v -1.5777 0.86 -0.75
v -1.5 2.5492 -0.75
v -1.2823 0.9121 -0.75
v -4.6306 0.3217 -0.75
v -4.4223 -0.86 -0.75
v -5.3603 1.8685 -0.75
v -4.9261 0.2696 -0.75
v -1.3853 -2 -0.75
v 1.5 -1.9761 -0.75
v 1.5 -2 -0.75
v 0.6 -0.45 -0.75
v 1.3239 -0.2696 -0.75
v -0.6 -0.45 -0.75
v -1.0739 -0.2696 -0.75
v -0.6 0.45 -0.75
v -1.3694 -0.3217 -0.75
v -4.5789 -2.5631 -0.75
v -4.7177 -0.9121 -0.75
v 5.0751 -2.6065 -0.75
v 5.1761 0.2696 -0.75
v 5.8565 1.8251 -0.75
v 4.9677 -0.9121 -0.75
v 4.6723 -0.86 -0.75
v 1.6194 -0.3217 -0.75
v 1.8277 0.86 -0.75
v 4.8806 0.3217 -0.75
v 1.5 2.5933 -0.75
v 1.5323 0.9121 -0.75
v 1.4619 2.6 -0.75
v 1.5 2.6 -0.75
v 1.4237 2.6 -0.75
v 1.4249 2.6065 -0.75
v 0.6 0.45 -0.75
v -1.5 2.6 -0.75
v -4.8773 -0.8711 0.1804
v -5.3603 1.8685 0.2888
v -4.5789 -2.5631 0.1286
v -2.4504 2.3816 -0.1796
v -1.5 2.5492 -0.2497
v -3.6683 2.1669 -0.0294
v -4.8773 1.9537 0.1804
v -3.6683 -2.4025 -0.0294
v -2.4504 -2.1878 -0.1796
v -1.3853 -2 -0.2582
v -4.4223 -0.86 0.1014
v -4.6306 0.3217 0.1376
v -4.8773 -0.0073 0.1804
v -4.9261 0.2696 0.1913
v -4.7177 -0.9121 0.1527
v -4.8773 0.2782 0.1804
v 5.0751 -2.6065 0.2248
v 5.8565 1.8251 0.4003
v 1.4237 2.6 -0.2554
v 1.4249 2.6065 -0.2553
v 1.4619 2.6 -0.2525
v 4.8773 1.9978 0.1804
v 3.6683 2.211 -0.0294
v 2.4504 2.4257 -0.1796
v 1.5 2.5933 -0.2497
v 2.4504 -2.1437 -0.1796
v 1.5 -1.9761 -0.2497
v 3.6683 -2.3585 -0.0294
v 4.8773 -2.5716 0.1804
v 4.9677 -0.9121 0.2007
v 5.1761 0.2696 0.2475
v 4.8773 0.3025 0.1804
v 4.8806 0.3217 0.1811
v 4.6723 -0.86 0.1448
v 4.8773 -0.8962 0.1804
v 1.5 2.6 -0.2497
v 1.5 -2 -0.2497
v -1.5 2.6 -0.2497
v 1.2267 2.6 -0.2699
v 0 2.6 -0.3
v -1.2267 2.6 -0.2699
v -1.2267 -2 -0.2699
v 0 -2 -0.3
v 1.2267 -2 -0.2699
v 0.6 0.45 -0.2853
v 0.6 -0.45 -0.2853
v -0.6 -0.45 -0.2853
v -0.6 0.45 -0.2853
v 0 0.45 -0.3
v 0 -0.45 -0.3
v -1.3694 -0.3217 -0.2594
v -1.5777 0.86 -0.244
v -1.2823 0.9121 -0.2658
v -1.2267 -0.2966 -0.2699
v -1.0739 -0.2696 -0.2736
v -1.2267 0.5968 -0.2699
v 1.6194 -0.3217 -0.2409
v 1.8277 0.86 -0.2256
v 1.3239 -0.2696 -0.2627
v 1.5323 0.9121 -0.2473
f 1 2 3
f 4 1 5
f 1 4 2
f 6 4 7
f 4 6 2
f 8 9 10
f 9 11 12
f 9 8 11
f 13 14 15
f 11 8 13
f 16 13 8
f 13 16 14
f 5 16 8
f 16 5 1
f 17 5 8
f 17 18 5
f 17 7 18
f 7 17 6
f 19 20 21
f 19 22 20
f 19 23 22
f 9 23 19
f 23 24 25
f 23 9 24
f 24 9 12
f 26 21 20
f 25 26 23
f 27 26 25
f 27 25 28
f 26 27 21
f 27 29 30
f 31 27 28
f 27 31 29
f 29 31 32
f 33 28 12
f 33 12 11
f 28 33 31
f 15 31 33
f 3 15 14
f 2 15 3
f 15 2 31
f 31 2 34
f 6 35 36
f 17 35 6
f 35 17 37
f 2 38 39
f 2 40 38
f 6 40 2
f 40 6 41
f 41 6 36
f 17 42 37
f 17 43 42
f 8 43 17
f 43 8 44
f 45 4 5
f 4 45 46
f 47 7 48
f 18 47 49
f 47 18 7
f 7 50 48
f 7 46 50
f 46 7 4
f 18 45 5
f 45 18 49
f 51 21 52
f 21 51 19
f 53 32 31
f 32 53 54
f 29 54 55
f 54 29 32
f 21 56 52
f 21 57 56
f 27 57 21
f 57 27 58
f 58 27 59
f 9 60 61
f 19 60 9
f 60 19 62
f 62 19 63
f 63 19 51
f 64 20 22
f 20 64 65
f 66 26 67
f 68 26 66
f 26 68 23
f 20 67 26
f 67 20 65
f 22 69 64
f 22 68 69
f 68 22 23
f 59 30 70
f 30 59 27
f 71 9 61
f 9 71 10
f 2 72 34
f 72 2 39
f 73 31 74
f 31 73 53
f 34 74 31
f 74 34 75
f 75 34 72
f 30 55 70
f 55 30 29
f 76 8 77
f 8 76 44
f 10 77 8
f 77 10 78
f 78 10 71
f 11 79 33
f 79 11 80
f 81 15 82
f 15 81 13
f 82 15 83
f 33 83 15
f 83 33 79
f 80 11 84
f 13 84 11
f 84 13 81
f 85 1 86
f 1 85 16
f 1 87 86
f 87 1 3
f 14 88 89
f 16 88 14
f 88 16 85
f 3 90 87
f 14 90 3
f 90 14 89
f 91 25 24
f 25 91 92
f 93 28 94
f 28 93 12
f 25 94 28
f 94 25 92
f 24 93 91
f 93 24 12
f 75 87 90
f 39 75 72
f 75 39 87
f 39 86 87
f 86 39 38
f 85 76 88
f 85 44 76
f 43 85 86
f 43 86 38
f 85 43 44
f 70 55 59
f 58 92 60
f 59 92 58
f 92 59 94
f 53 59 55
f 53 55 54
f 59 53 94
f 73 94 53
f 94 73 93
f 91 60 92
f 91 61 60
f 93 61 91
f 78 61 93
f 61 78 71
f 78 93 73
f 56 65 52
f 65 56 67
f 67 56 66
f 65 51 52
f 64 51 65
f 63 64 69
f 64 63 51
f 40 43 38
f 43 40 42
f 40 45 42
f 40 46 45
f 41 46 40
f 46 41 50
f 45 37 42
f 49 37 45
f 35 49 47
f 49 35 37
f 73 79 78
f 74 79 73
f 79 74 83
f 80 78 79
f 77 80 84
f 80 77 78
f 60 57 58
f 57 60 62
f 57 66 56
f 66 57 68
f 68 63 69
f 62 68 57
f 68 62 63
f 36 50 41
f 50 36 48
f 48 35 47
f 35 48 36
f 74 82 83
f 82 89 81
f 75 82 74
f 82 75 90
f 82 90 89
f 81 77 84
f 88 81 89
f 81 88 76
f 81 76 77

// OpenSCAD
// Generated by SolidPython 1.1.3 on 2024-04-22 10:17:04
$fn = 128;


union() {
	difference() {
		scale(v = [1, 1, 1.5000000000]) {
			difference() {
				difference() {
					union() {
						translate(v = [-3, 0, 0]) {
							rotate(a = [0, 0, 10]) {
								difference() {
									cube(center = true, size = [4, 4.5000000000, 1]);
									translate(v = [-1.7000000000, 0, 0]) {
										cube(center = true, size = [0.3000000000, 1.2000000000, 10]);
									}
								}
							}
						}
						translate(v = [3.2500000000, 0, 0]) {
							rotate(a = [0, 0, -10]) {
								difference() {
									cube(center = true, size = [4.5000000000, 4.5000000000, 1]);
									translate(v = [1.7000000000, 0, 0]) {
										cube(center = true, size = [0.3000000000, 1.2000000000, 10]);
									}
								}
							}
						}
						difference() {
							translate(v = [0, 0.3000000000, 0]) {
								cube(center = true, size = [3, 4.6000000000, 1]);
							}
							cube(center = true, size = [1.2000000000, 0.9000000000, 3]);
						}
					}
					translate(v = [-3, 0, 0]) {
						rotate(a = [0, 0, 10]) {
							translate(v = [1.7000000000, 0, 0]) {
								cube(center = true, size = [0.3000000000, 1.2000000000, 10]);
							}
						}
					}
				}
				translate(v = [3.2500000000, 0, 0]) {
					rotate(a = [0, 0, -10]) {
						translate(v = [-1.7000000000, 0, 0]) {
							cube(center = true, size = [0.3000000000, 1.2000000000, 10]);
						}
					}
				}
			}
		}
		translate(v = [0, 0, 24.7000000000]) {
			rotate(a = [90, 0, 0]) {
				cylinder(center = true, h = 10, r = 25);
			}
		}
	}
}
/***********************************************
*********      SolidPython code:      **********
************************************************
 
#! /usr/bin/env python3
import sys
import numpy as np
from solid import scad_render_to_file, difference
from solid.objects import cube, translate, union, rotate, color, cylinder, scale


SEGMENTS = 128

def basic_geometry():

    thickness = 1

    shapes = []
    finger_holder_l = cube([4, 4.5, thickness], center=True)
    tmp = translate([-1.7, 0, 0])(cube([.3, 1.2, 10], center=True))
    finger_holder_l = difference()(finger_holder_l, tmp)

    tmp = translate([1.7, 0, 0])(cube([.3, 1.2, 10], center=True))
    finger_holder_l = translate([-3, 0, 0])(rotate([0, 0, 10])(finger_holder_l))
    mini_hole_l = translate([-3, 0, 0])(rotate([0, 0, 10])(tmp))

    finger_holder_r = cube([4.5, 4.5, thickness], center=True)
    tmp = translate([1.7, 0, 0])(cube([.3, 1.2, 10], center=True))
    finger_holder_r = difference()(finger_holder_r, tmp)

    tmp = translate([-1.7, 0, 0])(cube([.3, 1.2, 10], center=True))
    finger_holder_r = translate([3.25, 0, 0])(rotate([0, 0, -10])(finger_holder_r))
    mini_hole_r = translate([3.25, 0, 0])(rotate([0, 0, -10])(tmp))

    connector = translate([0, .3, 0])(cube([3, 4.6, thickness], center=True))
    hole = cube([1.2, .9, 3], center=True)
    connector = difference()(connector, hole)

    finger_holder = union()(finger_holder_l, finger_holder_r, connector)
    finger_holder = difference()(finger_holder, mini_hole_l)
    finger_holder = difference()(finger_holder, mini_hole_r)
    finger_holder = scale([1, 1, 1.5])(finger_holder)

    curver = translate([0, 0, 24.7])(rotate([90, 0, 0])(cylinder(r=25, h=10, center=True)))
    finger_holder = difference()(finger_holder, curver)

    shapes.append(finger_holder)
    return union()(*shapes)

if __name__ == '__main__':
    out_dir = sys.argv[1] if len(sys.argv) > 1 else None

    a = basic_geometry()

    # Adding the file_header argument as shown allows you to change
    # the detail of arcs by changing the SEGMENTS variable.  This can
    # be expensive when making lots of small curves, but is otherwise
    # useful.
    file_out = scad_render_to_file(a, out_dir=out_dir, file_header=f'$fn = {SEGMENTS};')
    print(f"{__file__}: SCAD file written to: \n{file_out}")
 
 
************************************************/
